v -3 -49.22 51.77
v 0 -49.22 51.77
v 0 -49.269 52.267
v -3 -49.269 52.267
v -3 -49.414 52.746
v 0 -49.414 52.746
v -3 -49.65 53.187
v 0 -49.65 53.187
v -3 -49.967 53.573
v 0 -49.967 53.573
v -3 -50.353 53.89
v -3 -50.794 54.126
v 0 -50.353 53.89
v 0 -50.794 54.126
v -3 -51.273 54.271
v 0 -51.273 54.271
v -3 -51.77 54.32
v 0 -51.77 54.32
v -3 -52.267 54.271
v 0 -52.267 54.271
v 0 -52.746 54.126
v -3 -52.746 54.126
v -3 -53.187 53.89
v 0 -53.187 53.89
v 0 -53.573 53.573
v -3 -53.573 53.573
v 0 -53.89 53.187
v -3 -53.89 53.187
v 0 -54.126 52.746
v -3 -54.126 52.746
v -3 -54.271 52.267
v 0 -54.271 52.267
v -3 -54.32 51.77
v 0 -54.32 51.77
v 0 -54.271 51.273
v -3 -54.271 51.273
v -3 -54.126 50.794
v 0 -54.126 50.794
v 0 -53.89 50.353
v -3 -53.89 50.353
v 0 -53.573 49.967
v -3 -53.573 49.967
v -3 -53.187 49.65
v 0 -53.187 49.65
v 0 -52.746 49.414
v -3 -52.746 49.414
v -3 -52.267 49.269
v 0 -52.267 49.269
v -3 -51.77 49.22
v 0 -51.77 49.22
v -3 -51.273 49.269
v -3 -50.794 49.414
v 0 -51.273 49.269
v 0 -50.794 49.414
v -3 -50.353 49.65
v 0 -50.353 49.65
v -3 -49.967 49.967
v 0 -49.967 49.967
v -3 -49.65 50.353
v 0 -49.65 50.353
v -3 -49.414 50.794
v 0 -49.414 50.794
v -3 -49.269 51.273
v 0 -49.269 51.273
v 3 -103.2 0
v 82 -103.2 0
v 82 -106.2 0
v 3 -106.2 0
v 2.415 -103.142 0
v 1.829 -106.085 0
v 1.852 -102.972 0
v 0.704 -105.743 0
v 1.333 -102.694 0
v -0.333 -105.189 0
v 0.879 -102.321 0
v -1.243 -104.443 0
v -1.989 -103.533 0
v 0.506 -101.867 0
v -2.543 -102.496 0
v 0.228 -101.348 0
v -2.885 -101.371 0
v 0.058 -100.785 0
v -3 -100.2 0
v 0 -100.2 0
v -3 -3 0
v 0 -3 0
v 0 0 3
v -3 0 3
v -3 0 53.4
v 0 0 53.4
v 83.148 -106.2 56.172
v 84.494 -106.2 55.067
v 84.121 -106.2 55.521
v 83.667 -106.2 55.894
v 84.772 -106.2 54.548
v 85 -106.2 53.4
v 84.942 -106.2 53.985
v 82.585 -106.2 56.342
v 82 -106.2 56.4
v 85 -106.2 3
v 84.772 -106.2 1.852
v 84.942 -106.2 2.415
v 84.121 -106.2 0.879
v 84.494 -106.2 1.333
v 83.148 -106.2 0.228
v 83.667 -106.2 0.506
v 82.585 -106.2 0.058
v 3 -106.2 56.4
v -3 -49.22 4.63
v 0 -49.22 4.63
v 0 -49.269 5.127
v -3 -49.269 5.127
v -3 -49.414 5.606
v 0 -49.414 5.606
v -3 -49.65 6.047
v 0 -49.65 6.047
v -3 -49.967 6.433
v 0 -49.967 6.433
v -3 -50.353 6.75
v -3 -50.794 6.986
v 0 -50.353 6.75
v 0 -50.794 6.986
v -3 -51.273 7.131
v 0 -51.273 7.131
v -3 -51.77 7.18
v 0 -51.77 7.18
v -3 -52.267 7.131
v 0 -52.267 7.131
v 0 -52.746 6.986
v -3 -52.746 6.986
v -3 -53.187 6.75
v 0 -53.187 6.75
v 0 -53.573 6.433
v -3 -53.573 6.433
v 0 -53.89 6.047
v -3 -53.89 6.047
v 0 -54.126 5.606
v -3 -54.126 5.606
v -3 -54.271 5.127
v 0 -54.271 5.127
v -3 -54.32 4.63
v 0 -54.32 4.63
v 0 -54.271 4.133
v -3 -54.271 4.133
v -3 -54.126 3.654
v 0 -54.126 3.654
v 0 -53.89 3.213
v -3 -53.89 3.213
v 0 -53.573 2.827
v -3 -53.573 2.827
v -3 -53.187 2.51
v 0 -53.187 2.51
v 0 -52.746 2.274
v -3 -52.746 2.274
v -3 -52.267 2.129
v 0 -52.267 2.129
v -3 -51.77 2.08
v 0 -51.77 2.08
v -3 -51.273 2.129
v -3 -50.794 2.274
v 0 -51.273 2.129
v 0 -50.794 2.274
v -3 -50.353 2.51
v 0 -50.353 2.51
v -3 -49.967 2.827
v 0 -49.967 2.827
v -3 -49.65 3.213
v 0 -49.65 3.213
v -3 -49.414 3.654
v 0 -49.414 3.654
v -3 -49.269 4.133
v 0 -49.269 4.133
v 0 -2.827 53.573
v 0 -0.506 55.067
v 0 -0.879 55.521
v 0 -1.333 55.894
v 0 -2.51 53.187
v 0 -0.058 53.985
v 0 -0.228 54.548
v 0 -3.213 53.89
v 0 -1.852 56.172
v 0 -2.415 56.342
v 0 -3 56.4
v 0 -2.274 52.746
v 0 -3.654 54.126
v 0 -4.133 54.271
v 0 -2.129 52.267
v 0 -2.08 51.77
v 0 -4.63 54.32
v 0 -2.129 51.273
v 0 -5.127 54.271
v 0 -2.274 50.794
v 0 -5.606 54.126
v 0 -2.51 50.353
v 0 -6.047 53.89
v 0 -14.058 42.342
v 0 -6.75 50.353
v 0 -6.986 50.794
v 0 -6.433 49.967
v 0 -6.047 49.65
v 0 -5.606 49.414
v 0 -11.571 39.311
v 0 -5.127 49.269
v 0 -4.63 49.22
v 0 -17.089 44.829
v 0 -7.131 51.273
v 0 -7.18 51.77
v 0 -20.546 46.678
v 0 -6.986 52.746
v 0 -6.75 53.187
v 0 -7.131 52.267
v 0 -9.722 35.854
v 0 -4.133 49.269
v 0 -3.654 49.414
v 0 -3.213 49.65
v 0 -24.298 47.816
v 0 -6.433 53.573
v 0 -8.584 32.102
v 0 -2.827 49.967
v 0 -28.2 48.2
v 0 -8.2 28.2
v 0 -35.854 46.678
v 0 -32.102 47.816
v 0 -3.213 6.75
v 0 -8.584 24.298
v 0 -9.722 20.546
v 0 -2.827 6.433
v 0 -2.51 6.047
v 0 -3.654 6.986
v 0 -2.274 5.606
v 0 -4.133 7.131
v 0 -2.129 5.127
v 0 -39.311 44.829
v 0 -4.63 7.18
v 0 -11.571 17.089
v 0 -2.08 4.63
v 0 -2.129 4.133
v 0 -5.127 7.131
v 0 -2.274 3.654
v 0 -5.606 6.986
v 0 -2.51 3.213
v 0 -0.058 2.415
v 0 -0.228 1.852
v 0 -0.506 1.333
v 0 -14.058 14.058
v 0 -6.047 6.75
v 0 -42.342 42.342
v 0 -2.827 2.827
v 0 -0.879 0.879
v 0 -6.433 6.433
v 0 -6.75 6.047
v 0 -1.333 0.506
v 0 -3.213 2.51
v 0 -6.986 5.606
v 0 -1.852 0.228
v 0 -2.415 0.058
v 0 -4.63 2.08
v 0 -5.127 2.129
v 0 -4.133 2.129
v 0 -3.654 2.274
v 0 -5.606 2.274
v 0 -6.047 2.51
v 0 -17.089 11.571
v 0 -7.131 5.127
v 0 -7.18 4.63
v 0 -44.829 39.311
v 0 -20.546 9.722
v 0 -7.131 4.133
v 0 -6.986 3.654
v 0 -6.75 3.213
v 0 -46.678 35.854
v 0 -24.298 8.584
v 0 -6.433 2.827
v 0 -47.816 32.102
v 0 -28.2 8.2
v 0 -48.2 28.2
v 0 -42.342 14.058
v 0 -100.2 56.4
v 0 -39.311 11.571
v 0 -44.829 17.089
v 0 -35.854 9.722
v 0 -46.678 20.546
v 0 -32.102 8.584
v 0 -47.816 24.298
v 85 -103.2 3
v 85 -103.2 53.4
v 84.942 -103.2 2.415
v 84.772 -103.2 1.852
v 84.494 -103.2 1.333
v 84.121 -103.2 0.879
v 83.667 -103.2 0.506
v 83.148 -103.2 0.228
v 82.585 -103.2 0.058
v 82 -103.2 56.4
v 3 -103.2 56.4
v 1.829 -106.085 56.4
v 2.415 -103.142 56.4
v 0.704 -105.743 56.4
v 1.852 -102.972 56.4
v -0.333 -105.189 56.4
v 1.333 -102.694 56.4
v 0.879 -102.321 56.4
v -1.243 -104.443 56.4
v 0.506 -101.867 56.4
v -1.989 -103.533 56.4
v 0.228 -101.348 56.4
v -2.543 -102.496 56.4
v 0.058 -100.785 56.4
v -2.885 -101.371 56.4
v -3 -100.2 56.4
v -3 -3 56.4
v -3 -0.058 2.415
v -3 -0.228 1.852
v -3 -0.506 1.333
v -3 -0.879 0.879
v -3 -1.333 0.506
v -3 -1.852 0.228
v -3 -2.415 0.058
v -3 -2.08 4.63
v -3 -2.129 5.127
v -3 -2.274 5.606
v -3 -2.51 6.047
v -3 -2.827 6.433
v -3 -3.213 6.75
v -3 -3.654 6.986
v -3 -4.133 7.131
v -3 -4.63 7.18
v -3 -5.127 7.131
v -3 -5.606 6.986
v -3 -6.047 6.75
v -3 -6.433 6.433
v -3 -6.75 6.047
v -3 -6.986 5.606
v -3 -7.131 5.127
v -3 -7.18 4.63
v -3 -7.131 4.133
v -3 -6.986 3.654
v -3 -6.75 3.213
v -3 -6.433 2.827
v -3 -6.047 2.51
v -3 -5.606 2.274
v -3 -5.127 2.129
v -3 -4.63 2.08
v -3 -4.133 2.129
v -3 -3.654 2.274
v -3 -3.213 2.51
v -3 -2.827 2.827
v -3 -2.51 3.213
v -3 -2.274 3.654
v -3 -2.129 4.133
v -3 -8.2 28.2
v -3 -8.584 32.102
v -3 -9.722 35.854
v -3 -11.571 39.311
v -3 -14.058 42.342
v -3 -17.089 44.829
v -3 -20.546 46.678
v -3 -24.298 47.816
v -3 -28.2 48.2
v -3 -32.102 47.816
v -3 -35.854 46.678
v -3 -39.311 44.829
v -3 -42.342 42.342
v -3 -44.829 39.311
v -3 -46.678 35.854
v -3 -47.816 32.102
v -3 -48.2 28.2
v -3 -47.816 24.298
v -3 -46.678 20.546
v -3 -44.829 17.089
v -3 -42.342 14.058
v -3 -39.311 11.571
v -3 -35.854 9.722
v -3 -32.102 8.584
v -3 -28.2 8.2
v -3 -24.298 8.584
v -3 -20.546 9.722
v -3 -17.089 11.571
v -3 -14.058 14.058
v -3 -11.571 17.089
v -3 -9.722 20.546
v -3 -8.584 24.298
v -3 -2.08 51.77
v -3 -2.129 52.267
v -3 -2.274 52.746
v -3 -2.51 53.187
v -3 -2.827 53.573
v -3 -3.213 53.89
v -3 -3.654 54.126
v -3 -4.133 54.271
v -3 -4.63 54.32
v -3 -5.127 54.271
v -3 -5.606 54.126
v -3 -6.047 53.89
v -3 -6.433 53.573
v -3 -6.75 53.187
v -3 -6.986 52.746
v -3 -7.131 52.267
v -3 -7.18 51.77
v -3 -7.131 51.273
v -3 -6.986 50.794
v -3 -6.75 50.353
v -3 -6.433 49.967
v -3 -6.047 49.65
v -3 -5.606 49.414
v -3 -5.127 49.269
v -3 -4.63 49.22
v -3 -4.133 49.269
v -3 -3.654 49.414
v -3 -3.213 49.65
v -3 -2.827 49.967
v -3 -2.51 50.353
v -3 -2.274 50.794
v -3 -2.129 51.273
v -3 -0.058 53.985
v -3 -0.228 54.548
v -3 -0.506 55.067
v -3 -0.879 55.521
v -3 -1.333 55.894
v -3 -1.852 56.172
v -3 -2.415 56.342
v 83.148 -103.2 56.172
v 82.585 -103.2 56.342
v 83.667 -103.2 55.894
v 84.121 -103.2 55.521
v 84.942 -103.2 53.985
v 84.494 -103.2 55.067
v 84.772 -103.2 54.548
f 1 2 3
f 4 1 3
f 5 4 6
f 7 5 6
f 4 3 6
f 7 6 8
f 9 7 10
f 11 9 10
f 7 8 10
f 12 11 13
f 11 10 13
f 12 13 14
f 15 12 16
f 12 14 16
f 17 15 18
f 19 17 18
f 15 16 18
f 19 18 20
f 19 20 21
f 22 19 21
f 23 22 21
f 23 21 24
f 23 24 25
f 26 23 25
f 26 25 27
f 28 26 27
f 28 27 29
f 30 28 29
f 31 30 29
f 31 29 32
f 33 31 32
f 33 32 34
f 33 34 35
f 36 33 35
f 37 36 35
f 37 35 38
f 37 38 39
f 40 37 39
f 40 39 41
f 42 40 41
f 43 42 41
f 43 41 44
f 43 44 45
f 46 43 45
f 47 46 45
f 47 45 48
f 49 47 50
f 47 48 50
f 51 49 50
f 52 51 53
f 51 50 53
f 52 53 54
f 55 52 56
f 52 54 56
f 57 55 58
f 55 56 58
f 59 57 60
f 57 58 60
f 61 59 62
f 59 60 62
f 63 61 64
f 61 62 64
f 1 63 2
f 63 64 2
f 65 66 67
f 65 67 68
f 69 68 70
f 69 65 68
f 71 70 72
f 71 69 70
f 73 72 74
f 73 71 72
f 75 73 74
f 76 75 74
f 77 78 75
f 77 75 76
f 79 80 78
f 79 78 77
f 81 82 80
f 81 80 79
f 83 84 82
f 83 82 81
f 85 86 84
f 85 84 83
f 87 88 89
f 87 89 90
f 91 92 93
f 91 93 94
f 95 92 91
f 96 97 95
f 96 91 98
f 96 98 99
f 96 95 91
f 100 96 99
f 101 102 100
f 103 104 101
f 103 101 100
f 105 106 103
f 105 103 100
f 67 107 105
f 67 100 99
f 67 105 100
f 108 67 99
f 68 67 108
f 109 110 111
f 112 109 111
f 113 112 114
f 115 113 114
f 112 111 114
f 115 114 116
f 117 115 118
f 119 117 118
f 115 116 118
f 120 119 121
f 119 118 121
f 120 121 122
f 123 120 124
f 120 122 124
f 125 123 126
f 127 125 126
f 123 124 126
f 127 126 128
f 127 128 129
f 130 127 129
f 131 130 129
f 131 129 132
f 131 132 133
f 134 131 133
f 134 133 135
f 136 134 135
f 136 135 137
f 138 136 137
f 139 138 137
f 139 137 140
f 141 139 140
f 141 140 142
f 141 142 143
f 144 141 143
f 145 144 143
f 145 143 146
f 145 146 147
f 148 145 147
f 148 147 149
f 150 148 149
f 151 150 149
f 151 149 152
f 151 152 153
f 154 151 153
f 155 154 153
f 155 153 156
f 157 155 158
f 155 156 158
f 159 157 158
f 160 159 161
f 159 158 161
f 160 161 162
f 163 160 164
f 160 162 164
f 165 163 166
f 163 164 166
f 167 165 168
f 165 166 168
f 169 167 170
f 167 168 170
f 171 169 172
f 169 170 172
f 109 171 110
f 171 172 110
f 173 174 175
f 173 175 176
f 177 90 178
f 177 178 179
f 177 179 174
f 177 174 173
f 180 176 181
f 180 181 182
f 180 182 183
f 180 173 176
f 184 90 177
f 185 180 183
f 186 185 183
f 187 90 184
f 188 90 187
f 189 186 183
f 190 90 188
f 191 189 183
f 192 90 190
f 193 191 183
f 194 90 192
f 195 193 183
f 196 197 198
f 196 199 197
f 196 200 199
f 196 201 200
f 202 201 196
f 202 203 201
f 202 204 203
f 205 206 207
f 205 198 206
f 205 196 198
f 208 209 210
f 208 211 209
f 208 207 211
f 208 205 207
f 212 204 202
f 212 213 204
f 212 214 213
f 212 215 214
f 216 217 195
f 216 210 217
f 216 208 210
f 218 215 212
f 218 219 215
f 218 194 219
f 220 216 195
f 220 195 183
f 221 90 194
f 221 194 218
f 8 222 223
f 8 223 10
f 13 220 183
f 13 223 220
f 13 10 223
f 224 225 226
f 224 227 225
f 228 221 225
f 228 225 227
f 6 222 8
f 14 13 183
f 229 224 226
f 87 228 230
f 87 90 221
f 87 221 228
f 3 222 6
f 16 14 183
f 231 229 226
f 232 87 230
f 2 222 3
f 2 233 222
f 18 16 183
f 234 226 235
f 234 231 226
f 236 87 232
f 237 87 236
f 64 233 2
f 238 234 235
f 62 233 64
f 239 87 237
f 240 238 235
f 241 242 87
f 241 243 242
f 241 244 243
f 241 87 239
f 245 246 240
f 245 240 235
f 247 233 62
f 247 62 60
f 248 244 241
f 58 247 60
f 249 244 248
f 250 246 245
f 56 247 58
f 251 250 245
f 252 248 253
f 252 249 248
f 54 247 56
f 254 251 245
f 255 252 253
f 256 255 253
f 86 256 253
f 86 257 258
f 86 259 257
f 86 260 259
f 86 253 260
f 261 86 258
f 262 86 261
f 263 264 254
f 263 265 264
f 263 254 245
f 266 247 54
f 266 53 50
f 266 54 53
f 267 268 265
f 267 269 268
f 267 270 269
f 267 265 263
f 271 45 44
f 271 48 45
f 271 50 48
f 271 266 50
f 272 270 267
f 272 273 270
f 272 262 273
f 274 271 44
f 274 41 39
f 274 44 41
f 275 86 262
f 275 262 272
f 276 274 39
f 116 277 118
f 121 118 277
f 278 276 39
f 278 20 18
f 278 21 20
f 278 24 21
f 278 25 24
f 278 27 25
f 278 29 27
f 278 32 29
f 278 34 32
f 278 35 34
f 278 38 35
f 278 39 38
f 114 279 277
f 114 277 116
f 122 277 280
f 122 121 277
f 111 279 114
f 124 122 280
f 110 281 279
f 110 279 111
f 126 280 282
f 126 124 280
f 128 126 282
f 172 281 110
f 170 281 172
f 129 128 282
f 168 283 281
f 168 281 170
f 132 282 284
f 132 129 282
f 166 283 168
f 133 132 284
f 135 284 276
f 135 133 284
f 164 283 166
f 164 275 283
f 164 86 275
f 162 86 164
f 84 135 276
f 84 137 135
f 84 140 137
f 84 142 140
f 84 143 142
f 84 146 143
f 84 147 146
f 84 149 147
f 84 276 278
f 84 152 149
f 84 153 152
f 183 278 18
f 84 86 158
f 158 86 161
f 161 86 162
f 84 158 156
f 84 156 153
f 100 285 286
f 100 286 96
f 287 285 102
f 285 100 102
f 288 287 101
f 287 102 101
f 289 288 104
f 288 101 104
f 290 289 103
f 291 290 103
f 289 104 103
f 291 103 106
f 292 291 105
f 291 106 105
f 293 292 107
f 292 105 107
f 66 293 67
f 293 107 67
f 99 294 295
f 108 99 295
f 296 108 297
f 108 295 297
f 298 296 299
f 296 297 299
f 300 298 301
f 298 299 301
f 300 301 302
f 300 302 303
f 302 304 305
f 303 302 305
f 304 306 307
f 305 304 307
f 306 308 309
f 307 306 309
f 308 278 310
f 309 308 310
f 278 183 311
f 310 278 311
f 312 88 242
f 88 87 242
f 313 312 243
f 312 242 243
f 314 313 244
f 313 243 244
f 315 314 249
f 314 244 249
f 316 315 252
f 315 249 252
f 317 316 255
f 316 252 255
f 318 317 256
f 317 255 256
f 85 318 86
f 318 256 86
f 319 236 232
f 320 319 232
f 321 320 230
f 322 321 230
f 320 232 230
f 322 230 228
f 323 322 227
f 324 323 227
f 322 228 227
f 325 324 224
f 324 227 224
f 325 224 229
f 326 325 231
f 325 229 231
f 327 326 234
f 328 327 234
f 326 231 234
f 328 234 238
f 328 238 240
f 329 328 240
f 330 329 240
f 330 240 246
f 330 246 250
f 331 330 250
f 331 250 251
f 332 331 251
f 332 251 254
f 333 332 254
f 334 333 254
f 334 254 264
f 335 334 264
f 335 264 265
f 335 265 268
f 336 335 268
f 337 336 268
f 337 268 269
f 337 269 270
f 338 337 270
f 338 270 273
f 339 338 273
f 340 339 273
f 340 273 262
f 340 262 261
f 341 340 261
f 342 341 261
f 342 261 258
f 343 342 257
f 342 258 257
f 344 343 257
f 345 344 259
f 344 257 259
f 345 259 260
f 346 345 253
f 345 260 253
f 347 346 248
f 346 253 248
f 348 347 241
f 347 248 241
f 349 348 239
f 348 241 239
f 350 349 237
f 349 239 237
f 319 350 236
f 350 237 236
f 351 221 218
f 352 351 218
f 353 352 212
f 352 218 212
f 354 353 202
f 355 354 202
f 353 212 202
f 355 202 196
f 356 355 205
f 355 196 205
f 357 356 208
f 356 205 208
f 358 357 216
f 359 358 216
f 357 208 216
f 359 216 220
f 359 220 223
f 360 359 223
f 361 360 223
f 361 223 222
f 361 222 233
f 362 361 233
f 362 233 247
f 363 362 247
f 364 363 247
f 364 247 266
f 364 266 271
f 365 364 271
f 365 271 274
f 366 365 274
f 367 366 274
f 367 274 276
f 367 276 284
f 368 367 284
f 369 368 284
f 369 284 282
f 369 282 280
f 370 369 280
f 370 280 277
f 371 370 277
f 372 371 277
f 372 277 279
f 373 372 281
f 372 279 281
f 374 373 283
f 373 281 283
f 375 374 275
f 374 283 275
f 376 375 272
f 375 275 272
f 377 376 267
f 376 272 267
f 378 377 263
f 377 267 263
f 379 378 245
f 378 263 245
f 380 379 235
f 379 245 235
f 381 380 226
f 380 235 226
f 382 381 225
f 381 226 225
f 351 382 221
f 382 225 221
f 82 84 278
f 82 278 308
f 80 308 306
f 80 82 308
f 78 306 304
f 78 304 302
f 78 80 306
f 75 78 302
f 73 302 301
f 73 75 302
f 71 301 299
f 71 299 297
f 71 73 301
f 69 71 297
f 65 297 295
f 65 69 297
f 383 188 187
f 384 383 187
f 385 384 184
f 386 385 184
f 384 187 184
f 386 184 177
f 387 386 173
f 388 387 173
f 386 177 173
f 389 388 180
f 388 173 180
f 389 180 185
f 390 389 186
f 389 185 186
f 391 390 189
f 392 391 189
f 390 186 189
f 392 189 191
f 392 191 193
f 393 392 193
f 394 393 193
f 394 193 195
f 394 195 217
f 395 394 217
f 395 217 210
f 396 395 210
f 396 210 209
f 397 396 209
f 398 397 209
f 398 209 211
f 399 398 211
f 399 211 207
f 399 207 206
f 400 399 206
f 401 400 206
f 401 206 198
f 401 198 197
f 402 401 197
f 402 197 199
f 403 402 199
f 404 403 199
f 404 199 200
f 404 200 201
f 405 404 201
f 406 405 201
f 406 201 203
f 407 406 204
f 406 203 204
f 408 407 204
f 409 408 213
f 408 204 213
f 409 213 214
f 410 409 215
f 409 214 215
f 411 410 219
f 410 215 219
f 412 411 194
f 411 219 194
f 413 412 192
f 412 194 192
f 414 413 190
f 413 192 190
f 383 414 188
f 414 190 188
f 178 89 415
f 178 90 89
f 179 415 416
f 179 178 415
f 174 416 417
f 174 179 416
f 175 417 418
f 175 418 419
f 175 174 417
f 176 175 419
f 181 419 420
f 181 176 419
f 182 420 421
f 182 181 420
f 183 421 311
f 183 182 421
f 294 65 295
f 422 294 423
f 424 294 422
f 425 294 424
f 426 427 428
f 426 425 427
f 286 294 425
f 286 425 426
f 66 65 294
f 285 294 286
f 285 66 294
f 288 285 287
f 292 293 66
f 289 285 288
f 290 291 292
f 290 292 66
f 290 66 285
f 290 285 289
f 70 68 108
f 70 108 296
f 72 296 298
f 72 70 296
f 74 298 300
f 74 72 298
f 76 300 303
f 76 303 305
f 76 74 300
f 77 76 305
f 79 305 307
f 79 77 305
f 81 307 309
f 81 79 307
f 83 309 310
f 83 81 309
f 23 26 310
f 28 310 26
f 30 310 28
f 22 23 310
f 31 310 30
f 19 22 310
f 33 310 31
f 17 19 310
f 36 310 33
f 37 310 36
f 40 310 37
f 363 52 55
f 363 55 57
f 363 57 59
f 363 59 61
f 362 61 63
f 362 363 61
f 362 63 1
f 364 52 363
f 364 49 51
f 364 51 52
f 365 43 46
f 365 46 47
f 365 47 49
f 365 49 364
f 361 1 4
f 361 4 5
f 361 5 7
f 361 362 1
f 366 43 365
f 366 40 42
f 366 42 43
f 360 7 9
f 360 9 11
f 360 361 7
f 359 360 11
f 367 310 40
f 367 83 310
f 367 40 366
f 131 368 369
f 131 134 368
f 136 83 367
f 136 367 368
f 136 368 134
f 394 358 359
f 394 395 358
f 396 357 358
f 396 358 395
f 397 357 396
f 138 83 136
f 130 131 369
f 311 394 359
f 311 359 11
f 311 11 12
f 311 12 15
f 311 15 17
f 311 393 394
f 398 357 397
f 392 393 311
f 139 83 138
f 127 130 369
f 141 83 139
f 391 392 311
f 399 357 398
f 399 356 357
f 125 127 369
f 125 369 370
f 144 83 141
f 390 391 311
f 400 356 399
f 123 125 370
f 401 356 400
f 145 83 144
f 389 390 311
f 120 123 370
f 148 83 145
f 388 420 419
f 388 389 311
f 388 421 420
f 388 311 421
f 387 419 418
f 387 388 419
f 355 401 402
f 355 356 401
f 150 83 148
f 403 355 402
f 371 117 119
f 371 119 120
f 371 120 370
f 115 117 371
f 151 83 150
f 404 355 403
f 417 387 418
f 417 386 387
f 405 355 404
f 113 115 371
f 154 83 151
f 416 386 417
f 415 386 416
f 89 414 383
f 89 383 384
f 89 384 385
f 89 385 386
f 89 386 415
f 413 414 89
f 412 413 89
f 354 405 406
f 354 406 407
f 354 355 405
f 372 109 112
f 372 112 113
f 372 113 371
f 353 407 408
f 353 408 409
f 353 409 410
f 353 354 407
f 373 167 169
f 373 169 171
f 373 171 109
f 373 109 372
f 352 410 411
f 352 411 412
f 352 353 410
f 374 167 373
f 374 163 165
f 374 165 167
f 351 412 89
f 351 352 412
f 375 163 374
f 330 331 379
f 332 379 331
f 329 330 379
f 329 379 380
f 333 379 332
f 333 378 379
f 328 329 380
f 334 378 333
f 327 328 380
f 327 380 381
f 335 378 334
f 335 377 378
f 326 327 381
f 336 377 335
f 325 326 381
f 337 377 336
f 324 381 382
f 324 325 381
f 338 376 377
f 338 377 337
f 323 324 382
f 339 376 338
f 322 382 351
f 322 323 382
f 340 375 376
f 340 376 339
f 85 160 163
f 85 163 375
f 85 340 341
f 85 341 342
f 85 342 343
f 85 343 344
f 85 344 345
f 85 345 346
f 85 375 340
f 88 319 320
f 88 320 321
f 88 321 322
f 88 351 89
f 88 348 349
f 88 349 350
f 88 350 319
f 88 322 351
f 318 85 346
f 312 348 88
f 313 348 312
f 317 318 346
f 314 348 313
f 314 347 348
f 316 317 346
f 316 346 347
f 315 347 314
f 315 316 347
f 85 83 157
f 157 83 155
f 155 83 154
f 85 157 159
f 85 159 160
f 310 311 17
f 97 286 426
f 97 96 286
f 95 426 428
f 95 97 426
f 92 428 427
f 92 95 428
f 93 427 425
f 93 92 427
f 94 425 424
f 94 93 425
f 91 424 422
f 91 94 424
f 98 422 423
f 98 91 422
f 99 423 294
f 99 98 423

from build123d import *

# Parameters (mm, degrees)
SM_BASE_FLANGE_1_DEPTH = 56.4
FILLET_1_R             = 3
SKETCH_6_R             = 20
SKETCH_6_R_2           = 2.55
CUT_EXTRUDE_1_DEPTH    = 148.256239257


# Sheet-metal steps are written as plain solids
with BuildPart() as part:
    # Sketch 1 → Базовая кромка1 (new body)
    with BuildSketch(Plane.XY):
        with BuildLine():
            Line((0, 0), (0, -100.2))
            ThreePointArc((0, -100.2), (0.878679656, -102.321320344), (3, -103.2))
            Line((3, -103.2), (85, -103.2))
            Line((85, -103.2), (85, -106.2))
            Line((85, -106.2), (3, -106.2))
            ThreePointArc((3, -106.2), (-1.242640687, -104.442640687), (-3, -100.2))
            Line((-3, -100.2), (-3, 0))
            Line((-3, 0), (0, 0))
        make_face()
    extrude(amount=SM_BASE_FLANGE_1_DEPTH)

    # Скругление1
    fillet_1_edges = [part.edges().sort_by_distance(p)[0] for p in [
        (-1.5, 0, 56.4),
        (85, -104.7, 56.4),
        (-1.5, 0, 0),
        (85, -104.7, 0),
    ]]
    fillet(fillet_1_edges, radius=FILLET_1_R)

    # Эскиз6 → Вырез-Вытянуть1 (cut, through all)
    with BuildSketch(Plane(origin=(0, 0, 0), x_dir=(0, 0, -1), z_dir=(1, 0, 0))):
        with Locations(Location((-28.2, -28.2, 0), (0, 0, 90))):
            Circle(SKETCH_6_R)
        with Locations(Location((-51.77, -4.63, 0), (0, 0, 90))):
            Circle(SKETCH_6_R_2)
        with Locations(Location((-4.63, -4.63, 0), (0, 0, 90))):
            Circle(SKETCH_6_R_2)
        with Locations(Location((-4.63, -51.77, 0), (0, 0, 90))):
            Circle(SKETCH_6_R_2)
        with Locations(Location((-51.77, -51.77, 0), (0, 0, 90))):
            Circle(SKETCH_6_R_2)
    extrude(amount=-CUT_EXTRUDE_1_DEPTH, mode=Mode.SUBTRACT)


solid = part.part
